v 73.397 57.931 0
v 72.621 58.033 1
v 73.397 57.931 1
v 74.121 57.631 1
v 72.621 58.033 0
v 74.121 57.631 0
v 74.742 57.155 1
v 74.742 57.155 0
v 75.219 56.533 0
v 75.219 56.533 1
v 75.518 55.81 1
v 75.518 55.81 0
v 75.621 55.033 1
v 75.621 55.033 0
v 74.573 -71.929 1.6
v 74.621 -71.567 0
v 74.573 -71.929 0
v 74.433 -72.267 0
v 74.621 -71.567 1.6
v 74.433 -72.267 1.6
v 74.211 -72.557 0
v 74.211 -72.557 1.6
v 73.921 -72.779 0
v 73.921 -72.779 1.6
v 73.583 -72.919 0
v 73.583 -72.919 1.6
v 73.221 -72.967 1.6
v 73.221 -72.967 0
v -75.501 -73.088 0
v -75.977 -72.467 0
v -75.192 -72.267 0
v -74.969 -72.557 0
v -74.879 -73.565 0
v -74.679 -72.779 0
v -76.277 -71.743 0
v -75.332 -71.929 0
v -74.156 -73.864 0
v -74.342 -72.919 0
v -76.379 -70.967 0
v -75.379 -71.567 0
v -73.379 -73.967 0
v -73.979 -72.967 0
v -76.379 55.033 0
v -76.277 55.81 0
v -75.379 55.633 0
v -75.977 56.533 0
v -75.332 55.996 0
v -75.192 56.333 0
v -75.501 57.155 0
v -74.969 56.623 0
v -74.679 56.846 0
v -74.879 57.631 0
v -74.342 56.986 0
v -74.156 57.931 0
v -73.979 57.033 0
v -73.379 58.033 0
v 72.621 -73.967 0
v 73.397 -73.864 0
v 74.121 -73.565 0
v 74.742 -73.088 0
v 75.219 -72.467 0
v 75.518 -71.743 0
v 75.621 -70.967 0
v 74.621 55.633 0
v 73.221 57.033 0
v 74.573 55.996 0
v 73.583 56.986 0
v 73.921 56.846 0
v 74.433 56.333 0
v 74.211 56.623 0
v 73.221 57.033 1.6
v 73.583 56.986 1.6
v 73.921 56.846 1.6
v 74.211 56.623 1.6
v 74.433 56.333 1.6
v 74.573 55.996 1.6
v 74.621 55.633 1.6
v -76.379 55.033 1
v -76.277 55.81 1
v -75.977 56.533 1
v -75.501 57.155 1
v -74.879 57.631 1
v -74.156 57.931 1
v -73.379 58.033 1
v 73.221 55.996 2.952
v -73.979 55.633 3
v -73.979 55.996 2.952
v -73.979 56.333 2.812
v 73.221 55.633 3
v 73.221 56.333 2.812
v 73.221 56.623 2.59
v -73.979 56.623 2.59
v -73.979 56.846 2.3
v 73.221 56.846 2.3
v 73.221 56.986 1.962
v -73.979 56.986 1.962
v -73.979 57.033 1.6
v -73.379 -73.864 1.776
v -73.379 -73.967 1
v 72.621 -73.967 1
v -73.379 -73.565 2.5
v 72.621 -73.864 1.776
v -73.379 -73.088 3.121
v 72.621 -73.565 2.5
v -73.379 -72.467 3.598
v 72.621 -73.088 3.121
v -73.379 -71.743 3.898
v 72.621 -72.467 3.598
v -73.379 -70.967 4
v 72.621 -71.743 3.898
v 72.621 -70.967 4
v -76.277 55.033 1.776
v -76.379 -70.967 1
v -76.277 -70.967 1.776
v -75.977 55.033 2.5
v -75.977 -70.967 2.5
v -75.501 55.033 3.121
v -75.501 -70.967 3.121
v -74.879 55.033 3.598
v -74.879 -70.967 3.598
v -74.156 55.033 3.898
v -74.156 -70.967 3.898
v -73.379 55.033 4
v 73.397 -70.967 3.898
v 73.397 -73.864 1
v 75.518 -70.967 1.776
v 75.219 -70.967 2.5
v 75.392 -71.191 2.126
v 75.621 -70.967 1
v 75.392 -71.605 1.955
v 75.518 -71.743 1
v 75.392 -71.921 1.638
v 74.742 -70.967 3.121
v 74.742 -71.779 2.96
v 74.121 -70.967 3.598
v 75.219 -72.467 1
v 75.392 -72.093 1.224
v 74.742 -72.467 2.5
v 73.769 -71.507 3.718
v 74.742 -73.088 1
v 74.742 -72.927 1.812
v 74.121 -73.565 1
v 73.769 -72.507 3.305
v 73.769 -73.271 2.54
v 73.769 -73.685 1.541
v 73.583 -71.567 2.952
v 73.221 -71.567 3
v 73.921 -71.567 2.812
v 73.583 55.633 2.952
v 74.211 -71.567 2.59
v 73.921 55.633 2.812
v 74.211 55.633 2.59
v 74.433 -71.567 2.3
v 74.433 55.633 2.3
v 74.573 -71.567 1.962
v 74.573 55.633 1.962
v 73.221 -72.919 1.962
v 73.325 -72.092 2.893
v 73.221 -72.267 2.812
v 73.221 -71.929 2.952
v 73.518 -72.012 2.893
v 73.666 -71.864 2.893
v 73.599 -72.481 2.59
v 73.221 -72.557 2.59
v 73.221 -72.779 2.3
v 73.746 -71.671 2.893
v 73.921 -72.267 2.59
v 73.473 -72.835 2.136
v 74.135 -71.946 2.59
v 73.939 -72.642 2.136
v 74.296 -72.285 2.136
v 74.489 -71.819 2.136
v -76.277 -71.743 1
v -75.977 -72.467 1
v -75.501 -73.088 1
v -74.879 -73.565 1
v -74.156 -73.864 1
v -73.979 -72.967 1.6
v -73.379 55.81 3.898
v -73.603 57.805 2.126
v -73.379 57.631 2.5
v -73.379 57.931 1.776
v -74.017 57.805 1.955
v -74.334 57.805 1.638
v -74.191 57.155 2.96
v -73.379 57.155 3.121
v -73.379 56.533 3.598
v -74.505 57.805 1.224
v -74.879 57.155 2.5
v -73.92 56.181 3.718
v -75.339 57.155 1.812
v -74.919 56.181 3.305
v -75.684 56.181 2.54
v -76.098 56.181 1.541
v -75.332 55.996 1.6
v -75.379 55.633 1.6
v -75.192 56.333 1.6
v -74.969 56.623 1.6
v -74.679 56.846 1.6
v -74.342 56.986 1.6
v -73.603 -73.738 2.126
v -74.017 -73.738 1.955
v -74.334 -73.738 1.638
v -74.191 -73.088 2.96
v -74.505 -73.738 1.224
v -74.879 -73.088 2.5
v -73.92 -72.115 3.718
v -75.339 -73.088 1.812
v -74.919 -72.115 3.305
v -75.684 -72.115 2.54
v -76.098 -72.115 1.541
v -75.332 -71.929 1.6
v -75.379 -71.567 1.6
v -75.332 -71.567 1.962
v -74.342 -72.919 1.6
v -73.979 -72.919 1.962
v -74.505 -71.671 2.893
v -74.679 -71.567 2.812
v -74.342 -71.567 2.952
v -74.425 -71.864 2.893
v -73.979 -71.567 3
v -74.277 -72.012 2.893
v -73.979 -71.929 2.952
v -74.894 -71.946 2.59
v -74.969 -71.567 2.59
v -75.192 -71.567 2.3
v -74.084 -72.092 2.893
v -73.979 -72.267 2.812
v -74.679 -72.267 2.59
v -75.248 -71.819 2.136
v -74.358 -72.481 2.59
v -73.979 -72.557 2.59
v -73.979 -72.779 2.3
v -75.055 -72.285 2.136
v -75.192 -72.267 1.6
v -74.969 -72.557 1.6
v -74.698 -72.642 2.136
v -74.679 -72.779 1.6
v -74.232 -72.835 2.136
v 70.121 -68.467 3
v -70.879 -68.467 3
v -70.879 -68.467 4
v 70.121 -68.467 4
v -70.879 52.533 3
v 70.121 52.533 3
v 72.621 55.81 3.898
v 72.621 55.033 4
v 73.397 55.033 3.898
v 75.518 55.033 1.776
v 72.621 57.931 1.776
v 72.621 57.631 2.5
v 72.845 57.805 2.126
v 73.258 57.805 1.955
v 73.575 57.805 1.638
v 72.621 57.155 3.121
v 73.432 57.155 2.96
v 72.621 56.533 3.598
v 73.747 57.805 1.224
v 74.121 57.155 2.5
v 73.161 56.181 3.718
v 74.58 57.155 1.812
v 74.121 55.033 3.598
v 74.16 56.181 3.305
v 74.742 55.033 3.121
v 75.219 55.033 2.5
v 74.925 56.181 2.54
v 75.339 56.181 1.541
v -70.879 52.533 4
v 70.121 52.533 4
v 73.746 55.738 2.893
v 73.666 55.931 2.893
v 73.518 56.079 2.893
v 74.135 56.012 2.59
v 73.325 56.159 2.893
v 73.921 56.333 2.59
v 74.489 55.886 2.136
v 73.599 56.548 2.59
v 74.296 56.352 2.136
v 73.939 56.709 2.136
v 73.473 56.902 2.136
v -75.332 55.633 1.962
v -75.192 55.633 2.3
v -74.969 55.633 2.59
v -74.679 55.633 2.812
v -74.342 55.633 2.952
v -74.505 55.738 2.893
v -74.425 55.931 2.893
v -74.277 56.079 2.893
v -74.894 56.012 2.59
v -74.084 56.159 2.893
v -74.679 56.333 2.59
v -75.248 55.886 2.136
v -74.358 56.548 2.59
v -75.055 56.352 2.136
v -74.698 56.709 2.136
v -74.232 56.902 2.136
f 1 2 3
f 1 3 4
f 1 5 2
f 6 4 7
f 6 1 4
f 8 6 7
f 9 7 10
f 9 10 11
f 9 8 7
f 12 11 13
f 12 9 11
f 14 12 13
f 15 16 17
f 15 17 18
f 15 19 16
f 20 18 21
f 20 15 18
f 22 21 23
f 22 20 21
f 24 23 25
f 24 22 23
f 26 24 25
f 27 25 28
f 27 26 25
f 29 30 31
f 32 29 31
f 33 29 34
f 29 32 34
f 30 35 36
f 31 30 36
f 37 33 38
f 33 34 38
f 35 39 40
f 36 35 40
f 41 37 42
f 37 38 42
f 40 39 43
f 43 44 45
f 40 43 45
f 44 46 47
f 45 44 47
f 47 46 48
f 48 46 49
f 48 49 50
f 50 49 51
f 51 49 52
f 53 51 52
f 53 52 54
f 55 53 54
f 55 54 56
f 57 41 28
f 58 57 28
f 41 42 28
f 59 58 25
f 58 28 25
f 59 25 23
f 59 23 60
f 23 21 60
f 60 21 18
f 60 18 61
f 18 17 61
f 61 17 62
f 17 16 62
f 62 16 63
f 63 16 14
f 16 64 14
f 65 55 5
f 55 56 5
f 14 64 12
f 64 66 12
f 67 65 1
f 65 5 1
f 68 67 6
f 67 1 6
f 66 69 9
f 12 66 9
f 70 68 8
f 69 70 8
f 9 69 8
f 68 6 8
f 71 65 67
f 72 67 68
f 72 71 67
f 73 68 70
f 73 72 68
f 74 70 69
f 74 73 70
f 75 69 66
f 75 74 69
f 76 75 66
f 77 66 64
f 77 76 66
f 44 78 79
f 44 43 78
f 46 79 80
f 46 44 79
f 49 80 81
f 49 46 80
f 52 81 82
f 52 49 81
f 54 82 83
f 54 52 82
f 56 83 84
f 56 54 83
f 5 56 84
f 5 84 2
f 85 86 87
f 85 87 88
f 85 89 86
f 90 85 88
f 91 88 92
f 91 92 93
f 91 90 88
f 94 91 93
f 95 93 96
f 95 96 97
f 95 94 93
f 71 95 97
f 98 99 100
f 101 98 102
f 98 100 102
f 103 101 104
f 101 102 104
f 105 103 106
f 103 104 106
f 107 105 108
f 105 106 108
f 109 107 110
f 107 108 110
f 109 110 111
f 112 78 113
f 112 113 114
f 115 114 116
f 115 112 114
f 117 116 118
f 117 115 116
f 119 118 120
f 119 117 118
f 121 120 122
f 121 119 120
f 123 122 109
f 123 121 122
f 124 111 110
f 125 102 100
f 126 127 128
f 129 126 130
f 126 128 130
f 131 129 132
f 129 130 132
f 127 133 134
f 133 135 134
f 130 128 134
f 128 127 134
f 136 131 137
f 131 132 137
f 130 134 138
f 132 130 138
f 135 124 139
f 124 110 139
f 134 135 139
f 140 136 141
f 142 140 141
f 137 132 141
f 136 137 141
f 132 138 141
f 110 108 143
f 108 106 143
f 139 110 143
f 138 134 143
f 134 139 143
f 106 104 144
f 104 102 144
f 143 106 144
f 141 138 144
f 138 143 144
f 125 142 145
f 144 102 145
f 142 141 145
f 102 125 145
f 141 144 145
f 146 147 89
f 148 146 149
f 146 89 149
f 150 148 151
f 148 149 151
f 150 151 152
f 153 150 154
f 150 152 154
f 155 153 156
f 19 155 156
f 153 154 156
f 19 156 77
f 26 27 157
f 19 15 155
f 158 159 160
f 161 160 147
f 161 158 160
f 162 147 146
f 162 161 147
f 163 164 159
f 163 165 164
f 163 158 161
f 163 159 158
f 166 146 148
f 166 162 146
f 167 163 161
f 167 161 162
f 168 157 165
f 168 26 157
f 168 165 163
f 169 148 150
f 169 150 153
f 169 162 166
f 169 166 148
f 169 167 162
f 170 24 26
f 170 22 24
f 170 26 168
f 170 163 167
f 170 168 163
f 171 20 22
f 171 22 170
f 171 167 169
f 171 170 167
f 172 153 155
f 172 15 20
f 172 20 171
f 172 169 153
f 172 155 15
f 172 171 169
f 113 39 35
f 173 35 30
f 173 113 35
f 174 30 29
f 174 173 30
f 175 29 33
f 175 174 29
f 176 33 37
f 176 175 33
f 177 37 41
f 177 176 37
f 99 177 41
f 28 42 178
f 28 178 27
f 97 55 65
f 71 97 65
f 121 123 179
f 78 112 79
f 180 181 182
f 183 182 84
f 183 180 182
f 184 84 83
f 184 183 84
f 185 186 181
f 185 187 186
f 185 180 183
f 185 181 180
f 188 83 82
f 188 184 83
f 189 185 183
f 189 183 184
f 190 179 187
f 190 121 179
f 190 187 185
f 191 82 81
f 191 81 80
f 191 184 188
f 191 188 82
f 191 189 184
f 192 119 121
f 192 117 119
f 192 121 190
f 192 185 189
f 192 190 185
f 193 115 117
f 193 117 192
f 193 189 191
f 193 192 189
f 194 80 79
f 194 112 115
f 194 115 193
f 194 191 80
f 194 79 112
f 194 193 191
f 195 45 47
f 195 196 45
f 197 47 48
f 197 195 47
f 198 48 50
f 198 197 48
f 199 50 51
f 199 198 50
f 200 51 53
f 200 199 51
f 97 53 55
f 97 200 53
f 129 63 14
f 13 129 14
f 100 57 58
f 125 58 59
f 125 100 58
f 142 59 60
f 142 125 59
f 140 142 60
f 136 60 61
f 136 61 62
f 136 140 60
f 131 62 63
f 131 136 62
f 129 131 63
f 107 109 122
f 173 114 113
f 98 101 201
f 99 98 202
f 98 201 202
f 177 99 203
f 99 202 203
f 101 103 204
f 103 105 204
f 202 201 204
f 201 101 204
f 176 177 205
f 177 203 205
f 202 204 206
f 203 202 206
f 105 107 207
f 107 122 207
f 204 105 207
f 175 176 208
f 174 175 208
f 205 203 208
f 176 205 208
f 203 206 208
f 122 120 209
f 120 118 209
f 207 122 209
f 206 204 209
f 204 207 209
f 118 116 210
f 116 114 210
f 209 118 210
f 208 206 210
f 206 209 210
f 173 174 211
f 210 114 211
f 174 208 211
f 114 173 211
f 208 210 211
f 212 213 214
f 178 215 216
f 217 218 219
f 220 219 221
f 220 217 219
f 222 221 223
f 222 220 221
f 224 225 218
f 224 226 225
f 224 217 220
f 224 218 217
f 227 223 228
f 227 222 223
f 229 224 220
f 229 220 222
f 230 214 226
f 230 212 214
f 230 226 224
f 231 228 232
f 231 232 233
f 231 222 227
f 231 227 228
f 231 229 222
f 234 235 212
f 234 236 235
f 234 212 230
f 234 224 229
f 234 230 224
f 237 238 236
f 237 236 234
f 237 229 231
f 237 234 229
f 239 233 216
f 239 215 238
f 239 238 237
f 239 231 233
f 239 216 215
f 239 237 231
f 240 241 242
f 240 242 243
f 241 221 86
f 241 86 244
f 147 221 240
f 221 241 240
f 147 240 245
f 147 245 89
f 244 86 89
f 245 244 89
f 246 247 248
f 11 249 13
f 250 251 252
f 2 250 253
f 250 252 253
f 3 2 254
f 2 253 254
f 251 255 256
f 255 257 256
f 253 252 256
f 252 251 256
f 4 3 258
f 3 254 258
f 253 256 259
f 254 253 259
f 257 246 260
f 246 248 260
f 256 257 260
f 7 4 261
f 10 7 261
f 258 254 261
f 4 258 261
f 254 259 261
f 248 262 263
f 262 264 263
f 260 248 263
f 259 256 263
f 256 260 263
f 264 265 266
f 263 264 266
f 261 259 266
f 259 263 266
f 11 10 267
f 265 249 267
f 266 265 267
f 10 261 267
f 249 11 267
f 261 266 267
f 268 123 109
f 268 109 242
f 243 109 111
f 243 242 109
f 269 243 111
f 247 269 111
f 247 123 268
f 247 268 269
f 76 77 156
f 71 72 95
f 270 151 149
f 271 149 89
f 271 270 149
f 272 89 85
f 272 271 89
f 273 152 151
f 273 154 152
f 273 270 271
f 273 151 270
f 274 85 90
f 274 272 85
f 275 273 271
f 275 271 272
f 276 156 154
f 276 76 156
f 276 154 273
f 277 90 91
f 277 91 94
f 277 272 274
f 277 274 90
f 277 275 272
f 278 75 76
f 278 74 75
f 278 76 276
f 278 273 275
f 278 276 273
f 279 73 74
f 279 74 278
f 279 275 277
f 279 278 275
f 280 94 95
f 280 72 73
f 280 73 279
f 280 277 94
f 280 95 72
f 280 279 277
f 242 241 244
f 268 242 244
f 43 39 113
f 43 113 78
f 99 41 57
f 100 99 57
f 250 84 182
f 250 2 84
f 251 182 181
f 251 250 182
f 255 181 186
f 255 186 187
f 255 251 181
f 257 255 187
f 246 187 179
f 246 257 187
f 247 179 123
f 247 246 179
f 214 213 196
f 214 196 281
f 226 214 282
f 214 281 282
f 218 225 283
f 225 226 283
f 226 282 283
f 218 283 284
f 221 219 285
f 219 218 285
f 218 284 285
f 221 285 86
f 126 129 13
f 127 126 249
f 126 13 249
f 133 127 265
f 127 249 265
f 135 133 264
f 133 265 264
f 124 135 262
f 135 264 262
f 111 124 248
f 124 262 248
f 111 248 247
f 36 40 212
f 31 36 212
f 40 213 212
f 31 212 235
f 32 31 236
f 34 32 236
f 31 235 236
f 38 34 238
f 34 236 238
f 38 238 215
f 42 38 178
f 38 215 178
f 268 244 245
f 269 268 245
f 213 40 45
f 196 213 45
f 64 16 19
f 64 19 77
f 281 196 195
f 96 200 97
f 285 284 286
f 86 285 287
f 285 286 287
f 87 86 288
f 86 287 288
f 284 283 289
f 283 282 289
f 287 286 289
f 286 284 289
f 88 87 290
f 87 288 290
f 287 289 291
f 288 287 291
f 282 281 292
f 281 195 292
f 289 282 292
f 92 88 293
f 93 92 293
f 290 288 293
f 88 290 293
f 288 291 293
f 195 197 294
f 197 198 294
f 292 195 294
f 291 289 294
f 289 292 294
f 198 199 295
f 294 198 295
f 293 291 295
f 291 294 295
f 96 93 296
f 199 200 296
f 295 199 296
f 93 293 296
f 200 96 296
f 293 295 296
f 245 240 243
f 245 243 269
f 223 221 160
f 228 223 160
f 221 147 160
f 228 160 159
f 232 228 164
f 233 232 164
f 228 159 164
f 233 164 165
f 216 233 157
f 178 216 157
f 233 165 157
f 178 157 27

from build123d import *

# Parameters (mm, degrees)
SKETCH1_W           = 152
SKETCH1_H           = 132
SKETCH1_W_2         = 150
SKETCH1_H_2         = 130
BOSS_EXTRUDE1_DEPTH = 3
SKETCH2_W           = 152
SKETCH2_H           = 132
SKETCH2_W_2         = 141
SKETCH2_H_2         = 121
BOSS_EXTRUDE2_DEPTH = 1
FILLET1_R           = 1.4
FILLET2_R           = 3


with BuildPart() as part:
    # Sketch1 → Boss-Extrude1 (new body)
    with BuildSketch(Plane.XY):
        with Locations((-0.37936772, -7.96672213)):
            Rectangle(SKETCH1_W, SKETCH1_H)
        with Locations((-0.37936772, -7.96672213)):
            Rectangle(SKETCH1_W_2, SKETCH1_H_2, mode=Mode.SUBTRACT)
    extrude(amount=BOSS_EXTRUDE1_DEPTH)

    # Sketch2 → Boss-Extrude2 (add)
    with BuildSketch(Plane.XY.offset(3)):
        with Locations((-0.37936772, -7.96672213)):
            Rectangle(SKETCH2_W, SKETCH2_H)
        with Locations((-0.37936772, -7.96672213)):
            Rectangle(SKETCH2_W_2, SKETCH2_H_2, mode=Mode.SUBTRACT)
    extrude(amount=BOSS_EXTRUDE2_DEPTH)

    # Fillet1
    fillet1_edges = [part.edges().sort_by_distance(p)[0] for p in [
        (-75.37936772, 57.03327787, 1.5),
        (-75.37936772, -72.96672213, 1.5),
        (74.62063228, -72.96672213, 1.5),
        (74.62063228, 57.03327787, 1.5),
        (-75.37936772, -7.96672213, 3),
        (-0.37936772, -72.96672213, 3),
        (74.62063228, -7.96672213, 3),
        (-0.37936772, 57.03327787, 3),
    ]]
    fillet(fillet1_edges, radius=FILLET1_R)

    # Fillet2
    fillet2_edges = [part.edges().sort_by_distance(p)[0] for p in [
        (-76.37936772, -7.96672213, 4),
        (-0.37936772, -73.96672213, 4),
        (75.62063228, -7.96672213, 4),
        (-0.37936772, 58.03327787, 4),
        (-76.37936772, 58.03327787, 2),
        (75.62063228, 58.03327787, 2),
        (75.62063228, -73.96672213, 2),
        (-76.37936772, -73.96672213, 2),
    ]]
    fillet(fillet2_edges, radius=FILLET2_R)


solid = part.part
